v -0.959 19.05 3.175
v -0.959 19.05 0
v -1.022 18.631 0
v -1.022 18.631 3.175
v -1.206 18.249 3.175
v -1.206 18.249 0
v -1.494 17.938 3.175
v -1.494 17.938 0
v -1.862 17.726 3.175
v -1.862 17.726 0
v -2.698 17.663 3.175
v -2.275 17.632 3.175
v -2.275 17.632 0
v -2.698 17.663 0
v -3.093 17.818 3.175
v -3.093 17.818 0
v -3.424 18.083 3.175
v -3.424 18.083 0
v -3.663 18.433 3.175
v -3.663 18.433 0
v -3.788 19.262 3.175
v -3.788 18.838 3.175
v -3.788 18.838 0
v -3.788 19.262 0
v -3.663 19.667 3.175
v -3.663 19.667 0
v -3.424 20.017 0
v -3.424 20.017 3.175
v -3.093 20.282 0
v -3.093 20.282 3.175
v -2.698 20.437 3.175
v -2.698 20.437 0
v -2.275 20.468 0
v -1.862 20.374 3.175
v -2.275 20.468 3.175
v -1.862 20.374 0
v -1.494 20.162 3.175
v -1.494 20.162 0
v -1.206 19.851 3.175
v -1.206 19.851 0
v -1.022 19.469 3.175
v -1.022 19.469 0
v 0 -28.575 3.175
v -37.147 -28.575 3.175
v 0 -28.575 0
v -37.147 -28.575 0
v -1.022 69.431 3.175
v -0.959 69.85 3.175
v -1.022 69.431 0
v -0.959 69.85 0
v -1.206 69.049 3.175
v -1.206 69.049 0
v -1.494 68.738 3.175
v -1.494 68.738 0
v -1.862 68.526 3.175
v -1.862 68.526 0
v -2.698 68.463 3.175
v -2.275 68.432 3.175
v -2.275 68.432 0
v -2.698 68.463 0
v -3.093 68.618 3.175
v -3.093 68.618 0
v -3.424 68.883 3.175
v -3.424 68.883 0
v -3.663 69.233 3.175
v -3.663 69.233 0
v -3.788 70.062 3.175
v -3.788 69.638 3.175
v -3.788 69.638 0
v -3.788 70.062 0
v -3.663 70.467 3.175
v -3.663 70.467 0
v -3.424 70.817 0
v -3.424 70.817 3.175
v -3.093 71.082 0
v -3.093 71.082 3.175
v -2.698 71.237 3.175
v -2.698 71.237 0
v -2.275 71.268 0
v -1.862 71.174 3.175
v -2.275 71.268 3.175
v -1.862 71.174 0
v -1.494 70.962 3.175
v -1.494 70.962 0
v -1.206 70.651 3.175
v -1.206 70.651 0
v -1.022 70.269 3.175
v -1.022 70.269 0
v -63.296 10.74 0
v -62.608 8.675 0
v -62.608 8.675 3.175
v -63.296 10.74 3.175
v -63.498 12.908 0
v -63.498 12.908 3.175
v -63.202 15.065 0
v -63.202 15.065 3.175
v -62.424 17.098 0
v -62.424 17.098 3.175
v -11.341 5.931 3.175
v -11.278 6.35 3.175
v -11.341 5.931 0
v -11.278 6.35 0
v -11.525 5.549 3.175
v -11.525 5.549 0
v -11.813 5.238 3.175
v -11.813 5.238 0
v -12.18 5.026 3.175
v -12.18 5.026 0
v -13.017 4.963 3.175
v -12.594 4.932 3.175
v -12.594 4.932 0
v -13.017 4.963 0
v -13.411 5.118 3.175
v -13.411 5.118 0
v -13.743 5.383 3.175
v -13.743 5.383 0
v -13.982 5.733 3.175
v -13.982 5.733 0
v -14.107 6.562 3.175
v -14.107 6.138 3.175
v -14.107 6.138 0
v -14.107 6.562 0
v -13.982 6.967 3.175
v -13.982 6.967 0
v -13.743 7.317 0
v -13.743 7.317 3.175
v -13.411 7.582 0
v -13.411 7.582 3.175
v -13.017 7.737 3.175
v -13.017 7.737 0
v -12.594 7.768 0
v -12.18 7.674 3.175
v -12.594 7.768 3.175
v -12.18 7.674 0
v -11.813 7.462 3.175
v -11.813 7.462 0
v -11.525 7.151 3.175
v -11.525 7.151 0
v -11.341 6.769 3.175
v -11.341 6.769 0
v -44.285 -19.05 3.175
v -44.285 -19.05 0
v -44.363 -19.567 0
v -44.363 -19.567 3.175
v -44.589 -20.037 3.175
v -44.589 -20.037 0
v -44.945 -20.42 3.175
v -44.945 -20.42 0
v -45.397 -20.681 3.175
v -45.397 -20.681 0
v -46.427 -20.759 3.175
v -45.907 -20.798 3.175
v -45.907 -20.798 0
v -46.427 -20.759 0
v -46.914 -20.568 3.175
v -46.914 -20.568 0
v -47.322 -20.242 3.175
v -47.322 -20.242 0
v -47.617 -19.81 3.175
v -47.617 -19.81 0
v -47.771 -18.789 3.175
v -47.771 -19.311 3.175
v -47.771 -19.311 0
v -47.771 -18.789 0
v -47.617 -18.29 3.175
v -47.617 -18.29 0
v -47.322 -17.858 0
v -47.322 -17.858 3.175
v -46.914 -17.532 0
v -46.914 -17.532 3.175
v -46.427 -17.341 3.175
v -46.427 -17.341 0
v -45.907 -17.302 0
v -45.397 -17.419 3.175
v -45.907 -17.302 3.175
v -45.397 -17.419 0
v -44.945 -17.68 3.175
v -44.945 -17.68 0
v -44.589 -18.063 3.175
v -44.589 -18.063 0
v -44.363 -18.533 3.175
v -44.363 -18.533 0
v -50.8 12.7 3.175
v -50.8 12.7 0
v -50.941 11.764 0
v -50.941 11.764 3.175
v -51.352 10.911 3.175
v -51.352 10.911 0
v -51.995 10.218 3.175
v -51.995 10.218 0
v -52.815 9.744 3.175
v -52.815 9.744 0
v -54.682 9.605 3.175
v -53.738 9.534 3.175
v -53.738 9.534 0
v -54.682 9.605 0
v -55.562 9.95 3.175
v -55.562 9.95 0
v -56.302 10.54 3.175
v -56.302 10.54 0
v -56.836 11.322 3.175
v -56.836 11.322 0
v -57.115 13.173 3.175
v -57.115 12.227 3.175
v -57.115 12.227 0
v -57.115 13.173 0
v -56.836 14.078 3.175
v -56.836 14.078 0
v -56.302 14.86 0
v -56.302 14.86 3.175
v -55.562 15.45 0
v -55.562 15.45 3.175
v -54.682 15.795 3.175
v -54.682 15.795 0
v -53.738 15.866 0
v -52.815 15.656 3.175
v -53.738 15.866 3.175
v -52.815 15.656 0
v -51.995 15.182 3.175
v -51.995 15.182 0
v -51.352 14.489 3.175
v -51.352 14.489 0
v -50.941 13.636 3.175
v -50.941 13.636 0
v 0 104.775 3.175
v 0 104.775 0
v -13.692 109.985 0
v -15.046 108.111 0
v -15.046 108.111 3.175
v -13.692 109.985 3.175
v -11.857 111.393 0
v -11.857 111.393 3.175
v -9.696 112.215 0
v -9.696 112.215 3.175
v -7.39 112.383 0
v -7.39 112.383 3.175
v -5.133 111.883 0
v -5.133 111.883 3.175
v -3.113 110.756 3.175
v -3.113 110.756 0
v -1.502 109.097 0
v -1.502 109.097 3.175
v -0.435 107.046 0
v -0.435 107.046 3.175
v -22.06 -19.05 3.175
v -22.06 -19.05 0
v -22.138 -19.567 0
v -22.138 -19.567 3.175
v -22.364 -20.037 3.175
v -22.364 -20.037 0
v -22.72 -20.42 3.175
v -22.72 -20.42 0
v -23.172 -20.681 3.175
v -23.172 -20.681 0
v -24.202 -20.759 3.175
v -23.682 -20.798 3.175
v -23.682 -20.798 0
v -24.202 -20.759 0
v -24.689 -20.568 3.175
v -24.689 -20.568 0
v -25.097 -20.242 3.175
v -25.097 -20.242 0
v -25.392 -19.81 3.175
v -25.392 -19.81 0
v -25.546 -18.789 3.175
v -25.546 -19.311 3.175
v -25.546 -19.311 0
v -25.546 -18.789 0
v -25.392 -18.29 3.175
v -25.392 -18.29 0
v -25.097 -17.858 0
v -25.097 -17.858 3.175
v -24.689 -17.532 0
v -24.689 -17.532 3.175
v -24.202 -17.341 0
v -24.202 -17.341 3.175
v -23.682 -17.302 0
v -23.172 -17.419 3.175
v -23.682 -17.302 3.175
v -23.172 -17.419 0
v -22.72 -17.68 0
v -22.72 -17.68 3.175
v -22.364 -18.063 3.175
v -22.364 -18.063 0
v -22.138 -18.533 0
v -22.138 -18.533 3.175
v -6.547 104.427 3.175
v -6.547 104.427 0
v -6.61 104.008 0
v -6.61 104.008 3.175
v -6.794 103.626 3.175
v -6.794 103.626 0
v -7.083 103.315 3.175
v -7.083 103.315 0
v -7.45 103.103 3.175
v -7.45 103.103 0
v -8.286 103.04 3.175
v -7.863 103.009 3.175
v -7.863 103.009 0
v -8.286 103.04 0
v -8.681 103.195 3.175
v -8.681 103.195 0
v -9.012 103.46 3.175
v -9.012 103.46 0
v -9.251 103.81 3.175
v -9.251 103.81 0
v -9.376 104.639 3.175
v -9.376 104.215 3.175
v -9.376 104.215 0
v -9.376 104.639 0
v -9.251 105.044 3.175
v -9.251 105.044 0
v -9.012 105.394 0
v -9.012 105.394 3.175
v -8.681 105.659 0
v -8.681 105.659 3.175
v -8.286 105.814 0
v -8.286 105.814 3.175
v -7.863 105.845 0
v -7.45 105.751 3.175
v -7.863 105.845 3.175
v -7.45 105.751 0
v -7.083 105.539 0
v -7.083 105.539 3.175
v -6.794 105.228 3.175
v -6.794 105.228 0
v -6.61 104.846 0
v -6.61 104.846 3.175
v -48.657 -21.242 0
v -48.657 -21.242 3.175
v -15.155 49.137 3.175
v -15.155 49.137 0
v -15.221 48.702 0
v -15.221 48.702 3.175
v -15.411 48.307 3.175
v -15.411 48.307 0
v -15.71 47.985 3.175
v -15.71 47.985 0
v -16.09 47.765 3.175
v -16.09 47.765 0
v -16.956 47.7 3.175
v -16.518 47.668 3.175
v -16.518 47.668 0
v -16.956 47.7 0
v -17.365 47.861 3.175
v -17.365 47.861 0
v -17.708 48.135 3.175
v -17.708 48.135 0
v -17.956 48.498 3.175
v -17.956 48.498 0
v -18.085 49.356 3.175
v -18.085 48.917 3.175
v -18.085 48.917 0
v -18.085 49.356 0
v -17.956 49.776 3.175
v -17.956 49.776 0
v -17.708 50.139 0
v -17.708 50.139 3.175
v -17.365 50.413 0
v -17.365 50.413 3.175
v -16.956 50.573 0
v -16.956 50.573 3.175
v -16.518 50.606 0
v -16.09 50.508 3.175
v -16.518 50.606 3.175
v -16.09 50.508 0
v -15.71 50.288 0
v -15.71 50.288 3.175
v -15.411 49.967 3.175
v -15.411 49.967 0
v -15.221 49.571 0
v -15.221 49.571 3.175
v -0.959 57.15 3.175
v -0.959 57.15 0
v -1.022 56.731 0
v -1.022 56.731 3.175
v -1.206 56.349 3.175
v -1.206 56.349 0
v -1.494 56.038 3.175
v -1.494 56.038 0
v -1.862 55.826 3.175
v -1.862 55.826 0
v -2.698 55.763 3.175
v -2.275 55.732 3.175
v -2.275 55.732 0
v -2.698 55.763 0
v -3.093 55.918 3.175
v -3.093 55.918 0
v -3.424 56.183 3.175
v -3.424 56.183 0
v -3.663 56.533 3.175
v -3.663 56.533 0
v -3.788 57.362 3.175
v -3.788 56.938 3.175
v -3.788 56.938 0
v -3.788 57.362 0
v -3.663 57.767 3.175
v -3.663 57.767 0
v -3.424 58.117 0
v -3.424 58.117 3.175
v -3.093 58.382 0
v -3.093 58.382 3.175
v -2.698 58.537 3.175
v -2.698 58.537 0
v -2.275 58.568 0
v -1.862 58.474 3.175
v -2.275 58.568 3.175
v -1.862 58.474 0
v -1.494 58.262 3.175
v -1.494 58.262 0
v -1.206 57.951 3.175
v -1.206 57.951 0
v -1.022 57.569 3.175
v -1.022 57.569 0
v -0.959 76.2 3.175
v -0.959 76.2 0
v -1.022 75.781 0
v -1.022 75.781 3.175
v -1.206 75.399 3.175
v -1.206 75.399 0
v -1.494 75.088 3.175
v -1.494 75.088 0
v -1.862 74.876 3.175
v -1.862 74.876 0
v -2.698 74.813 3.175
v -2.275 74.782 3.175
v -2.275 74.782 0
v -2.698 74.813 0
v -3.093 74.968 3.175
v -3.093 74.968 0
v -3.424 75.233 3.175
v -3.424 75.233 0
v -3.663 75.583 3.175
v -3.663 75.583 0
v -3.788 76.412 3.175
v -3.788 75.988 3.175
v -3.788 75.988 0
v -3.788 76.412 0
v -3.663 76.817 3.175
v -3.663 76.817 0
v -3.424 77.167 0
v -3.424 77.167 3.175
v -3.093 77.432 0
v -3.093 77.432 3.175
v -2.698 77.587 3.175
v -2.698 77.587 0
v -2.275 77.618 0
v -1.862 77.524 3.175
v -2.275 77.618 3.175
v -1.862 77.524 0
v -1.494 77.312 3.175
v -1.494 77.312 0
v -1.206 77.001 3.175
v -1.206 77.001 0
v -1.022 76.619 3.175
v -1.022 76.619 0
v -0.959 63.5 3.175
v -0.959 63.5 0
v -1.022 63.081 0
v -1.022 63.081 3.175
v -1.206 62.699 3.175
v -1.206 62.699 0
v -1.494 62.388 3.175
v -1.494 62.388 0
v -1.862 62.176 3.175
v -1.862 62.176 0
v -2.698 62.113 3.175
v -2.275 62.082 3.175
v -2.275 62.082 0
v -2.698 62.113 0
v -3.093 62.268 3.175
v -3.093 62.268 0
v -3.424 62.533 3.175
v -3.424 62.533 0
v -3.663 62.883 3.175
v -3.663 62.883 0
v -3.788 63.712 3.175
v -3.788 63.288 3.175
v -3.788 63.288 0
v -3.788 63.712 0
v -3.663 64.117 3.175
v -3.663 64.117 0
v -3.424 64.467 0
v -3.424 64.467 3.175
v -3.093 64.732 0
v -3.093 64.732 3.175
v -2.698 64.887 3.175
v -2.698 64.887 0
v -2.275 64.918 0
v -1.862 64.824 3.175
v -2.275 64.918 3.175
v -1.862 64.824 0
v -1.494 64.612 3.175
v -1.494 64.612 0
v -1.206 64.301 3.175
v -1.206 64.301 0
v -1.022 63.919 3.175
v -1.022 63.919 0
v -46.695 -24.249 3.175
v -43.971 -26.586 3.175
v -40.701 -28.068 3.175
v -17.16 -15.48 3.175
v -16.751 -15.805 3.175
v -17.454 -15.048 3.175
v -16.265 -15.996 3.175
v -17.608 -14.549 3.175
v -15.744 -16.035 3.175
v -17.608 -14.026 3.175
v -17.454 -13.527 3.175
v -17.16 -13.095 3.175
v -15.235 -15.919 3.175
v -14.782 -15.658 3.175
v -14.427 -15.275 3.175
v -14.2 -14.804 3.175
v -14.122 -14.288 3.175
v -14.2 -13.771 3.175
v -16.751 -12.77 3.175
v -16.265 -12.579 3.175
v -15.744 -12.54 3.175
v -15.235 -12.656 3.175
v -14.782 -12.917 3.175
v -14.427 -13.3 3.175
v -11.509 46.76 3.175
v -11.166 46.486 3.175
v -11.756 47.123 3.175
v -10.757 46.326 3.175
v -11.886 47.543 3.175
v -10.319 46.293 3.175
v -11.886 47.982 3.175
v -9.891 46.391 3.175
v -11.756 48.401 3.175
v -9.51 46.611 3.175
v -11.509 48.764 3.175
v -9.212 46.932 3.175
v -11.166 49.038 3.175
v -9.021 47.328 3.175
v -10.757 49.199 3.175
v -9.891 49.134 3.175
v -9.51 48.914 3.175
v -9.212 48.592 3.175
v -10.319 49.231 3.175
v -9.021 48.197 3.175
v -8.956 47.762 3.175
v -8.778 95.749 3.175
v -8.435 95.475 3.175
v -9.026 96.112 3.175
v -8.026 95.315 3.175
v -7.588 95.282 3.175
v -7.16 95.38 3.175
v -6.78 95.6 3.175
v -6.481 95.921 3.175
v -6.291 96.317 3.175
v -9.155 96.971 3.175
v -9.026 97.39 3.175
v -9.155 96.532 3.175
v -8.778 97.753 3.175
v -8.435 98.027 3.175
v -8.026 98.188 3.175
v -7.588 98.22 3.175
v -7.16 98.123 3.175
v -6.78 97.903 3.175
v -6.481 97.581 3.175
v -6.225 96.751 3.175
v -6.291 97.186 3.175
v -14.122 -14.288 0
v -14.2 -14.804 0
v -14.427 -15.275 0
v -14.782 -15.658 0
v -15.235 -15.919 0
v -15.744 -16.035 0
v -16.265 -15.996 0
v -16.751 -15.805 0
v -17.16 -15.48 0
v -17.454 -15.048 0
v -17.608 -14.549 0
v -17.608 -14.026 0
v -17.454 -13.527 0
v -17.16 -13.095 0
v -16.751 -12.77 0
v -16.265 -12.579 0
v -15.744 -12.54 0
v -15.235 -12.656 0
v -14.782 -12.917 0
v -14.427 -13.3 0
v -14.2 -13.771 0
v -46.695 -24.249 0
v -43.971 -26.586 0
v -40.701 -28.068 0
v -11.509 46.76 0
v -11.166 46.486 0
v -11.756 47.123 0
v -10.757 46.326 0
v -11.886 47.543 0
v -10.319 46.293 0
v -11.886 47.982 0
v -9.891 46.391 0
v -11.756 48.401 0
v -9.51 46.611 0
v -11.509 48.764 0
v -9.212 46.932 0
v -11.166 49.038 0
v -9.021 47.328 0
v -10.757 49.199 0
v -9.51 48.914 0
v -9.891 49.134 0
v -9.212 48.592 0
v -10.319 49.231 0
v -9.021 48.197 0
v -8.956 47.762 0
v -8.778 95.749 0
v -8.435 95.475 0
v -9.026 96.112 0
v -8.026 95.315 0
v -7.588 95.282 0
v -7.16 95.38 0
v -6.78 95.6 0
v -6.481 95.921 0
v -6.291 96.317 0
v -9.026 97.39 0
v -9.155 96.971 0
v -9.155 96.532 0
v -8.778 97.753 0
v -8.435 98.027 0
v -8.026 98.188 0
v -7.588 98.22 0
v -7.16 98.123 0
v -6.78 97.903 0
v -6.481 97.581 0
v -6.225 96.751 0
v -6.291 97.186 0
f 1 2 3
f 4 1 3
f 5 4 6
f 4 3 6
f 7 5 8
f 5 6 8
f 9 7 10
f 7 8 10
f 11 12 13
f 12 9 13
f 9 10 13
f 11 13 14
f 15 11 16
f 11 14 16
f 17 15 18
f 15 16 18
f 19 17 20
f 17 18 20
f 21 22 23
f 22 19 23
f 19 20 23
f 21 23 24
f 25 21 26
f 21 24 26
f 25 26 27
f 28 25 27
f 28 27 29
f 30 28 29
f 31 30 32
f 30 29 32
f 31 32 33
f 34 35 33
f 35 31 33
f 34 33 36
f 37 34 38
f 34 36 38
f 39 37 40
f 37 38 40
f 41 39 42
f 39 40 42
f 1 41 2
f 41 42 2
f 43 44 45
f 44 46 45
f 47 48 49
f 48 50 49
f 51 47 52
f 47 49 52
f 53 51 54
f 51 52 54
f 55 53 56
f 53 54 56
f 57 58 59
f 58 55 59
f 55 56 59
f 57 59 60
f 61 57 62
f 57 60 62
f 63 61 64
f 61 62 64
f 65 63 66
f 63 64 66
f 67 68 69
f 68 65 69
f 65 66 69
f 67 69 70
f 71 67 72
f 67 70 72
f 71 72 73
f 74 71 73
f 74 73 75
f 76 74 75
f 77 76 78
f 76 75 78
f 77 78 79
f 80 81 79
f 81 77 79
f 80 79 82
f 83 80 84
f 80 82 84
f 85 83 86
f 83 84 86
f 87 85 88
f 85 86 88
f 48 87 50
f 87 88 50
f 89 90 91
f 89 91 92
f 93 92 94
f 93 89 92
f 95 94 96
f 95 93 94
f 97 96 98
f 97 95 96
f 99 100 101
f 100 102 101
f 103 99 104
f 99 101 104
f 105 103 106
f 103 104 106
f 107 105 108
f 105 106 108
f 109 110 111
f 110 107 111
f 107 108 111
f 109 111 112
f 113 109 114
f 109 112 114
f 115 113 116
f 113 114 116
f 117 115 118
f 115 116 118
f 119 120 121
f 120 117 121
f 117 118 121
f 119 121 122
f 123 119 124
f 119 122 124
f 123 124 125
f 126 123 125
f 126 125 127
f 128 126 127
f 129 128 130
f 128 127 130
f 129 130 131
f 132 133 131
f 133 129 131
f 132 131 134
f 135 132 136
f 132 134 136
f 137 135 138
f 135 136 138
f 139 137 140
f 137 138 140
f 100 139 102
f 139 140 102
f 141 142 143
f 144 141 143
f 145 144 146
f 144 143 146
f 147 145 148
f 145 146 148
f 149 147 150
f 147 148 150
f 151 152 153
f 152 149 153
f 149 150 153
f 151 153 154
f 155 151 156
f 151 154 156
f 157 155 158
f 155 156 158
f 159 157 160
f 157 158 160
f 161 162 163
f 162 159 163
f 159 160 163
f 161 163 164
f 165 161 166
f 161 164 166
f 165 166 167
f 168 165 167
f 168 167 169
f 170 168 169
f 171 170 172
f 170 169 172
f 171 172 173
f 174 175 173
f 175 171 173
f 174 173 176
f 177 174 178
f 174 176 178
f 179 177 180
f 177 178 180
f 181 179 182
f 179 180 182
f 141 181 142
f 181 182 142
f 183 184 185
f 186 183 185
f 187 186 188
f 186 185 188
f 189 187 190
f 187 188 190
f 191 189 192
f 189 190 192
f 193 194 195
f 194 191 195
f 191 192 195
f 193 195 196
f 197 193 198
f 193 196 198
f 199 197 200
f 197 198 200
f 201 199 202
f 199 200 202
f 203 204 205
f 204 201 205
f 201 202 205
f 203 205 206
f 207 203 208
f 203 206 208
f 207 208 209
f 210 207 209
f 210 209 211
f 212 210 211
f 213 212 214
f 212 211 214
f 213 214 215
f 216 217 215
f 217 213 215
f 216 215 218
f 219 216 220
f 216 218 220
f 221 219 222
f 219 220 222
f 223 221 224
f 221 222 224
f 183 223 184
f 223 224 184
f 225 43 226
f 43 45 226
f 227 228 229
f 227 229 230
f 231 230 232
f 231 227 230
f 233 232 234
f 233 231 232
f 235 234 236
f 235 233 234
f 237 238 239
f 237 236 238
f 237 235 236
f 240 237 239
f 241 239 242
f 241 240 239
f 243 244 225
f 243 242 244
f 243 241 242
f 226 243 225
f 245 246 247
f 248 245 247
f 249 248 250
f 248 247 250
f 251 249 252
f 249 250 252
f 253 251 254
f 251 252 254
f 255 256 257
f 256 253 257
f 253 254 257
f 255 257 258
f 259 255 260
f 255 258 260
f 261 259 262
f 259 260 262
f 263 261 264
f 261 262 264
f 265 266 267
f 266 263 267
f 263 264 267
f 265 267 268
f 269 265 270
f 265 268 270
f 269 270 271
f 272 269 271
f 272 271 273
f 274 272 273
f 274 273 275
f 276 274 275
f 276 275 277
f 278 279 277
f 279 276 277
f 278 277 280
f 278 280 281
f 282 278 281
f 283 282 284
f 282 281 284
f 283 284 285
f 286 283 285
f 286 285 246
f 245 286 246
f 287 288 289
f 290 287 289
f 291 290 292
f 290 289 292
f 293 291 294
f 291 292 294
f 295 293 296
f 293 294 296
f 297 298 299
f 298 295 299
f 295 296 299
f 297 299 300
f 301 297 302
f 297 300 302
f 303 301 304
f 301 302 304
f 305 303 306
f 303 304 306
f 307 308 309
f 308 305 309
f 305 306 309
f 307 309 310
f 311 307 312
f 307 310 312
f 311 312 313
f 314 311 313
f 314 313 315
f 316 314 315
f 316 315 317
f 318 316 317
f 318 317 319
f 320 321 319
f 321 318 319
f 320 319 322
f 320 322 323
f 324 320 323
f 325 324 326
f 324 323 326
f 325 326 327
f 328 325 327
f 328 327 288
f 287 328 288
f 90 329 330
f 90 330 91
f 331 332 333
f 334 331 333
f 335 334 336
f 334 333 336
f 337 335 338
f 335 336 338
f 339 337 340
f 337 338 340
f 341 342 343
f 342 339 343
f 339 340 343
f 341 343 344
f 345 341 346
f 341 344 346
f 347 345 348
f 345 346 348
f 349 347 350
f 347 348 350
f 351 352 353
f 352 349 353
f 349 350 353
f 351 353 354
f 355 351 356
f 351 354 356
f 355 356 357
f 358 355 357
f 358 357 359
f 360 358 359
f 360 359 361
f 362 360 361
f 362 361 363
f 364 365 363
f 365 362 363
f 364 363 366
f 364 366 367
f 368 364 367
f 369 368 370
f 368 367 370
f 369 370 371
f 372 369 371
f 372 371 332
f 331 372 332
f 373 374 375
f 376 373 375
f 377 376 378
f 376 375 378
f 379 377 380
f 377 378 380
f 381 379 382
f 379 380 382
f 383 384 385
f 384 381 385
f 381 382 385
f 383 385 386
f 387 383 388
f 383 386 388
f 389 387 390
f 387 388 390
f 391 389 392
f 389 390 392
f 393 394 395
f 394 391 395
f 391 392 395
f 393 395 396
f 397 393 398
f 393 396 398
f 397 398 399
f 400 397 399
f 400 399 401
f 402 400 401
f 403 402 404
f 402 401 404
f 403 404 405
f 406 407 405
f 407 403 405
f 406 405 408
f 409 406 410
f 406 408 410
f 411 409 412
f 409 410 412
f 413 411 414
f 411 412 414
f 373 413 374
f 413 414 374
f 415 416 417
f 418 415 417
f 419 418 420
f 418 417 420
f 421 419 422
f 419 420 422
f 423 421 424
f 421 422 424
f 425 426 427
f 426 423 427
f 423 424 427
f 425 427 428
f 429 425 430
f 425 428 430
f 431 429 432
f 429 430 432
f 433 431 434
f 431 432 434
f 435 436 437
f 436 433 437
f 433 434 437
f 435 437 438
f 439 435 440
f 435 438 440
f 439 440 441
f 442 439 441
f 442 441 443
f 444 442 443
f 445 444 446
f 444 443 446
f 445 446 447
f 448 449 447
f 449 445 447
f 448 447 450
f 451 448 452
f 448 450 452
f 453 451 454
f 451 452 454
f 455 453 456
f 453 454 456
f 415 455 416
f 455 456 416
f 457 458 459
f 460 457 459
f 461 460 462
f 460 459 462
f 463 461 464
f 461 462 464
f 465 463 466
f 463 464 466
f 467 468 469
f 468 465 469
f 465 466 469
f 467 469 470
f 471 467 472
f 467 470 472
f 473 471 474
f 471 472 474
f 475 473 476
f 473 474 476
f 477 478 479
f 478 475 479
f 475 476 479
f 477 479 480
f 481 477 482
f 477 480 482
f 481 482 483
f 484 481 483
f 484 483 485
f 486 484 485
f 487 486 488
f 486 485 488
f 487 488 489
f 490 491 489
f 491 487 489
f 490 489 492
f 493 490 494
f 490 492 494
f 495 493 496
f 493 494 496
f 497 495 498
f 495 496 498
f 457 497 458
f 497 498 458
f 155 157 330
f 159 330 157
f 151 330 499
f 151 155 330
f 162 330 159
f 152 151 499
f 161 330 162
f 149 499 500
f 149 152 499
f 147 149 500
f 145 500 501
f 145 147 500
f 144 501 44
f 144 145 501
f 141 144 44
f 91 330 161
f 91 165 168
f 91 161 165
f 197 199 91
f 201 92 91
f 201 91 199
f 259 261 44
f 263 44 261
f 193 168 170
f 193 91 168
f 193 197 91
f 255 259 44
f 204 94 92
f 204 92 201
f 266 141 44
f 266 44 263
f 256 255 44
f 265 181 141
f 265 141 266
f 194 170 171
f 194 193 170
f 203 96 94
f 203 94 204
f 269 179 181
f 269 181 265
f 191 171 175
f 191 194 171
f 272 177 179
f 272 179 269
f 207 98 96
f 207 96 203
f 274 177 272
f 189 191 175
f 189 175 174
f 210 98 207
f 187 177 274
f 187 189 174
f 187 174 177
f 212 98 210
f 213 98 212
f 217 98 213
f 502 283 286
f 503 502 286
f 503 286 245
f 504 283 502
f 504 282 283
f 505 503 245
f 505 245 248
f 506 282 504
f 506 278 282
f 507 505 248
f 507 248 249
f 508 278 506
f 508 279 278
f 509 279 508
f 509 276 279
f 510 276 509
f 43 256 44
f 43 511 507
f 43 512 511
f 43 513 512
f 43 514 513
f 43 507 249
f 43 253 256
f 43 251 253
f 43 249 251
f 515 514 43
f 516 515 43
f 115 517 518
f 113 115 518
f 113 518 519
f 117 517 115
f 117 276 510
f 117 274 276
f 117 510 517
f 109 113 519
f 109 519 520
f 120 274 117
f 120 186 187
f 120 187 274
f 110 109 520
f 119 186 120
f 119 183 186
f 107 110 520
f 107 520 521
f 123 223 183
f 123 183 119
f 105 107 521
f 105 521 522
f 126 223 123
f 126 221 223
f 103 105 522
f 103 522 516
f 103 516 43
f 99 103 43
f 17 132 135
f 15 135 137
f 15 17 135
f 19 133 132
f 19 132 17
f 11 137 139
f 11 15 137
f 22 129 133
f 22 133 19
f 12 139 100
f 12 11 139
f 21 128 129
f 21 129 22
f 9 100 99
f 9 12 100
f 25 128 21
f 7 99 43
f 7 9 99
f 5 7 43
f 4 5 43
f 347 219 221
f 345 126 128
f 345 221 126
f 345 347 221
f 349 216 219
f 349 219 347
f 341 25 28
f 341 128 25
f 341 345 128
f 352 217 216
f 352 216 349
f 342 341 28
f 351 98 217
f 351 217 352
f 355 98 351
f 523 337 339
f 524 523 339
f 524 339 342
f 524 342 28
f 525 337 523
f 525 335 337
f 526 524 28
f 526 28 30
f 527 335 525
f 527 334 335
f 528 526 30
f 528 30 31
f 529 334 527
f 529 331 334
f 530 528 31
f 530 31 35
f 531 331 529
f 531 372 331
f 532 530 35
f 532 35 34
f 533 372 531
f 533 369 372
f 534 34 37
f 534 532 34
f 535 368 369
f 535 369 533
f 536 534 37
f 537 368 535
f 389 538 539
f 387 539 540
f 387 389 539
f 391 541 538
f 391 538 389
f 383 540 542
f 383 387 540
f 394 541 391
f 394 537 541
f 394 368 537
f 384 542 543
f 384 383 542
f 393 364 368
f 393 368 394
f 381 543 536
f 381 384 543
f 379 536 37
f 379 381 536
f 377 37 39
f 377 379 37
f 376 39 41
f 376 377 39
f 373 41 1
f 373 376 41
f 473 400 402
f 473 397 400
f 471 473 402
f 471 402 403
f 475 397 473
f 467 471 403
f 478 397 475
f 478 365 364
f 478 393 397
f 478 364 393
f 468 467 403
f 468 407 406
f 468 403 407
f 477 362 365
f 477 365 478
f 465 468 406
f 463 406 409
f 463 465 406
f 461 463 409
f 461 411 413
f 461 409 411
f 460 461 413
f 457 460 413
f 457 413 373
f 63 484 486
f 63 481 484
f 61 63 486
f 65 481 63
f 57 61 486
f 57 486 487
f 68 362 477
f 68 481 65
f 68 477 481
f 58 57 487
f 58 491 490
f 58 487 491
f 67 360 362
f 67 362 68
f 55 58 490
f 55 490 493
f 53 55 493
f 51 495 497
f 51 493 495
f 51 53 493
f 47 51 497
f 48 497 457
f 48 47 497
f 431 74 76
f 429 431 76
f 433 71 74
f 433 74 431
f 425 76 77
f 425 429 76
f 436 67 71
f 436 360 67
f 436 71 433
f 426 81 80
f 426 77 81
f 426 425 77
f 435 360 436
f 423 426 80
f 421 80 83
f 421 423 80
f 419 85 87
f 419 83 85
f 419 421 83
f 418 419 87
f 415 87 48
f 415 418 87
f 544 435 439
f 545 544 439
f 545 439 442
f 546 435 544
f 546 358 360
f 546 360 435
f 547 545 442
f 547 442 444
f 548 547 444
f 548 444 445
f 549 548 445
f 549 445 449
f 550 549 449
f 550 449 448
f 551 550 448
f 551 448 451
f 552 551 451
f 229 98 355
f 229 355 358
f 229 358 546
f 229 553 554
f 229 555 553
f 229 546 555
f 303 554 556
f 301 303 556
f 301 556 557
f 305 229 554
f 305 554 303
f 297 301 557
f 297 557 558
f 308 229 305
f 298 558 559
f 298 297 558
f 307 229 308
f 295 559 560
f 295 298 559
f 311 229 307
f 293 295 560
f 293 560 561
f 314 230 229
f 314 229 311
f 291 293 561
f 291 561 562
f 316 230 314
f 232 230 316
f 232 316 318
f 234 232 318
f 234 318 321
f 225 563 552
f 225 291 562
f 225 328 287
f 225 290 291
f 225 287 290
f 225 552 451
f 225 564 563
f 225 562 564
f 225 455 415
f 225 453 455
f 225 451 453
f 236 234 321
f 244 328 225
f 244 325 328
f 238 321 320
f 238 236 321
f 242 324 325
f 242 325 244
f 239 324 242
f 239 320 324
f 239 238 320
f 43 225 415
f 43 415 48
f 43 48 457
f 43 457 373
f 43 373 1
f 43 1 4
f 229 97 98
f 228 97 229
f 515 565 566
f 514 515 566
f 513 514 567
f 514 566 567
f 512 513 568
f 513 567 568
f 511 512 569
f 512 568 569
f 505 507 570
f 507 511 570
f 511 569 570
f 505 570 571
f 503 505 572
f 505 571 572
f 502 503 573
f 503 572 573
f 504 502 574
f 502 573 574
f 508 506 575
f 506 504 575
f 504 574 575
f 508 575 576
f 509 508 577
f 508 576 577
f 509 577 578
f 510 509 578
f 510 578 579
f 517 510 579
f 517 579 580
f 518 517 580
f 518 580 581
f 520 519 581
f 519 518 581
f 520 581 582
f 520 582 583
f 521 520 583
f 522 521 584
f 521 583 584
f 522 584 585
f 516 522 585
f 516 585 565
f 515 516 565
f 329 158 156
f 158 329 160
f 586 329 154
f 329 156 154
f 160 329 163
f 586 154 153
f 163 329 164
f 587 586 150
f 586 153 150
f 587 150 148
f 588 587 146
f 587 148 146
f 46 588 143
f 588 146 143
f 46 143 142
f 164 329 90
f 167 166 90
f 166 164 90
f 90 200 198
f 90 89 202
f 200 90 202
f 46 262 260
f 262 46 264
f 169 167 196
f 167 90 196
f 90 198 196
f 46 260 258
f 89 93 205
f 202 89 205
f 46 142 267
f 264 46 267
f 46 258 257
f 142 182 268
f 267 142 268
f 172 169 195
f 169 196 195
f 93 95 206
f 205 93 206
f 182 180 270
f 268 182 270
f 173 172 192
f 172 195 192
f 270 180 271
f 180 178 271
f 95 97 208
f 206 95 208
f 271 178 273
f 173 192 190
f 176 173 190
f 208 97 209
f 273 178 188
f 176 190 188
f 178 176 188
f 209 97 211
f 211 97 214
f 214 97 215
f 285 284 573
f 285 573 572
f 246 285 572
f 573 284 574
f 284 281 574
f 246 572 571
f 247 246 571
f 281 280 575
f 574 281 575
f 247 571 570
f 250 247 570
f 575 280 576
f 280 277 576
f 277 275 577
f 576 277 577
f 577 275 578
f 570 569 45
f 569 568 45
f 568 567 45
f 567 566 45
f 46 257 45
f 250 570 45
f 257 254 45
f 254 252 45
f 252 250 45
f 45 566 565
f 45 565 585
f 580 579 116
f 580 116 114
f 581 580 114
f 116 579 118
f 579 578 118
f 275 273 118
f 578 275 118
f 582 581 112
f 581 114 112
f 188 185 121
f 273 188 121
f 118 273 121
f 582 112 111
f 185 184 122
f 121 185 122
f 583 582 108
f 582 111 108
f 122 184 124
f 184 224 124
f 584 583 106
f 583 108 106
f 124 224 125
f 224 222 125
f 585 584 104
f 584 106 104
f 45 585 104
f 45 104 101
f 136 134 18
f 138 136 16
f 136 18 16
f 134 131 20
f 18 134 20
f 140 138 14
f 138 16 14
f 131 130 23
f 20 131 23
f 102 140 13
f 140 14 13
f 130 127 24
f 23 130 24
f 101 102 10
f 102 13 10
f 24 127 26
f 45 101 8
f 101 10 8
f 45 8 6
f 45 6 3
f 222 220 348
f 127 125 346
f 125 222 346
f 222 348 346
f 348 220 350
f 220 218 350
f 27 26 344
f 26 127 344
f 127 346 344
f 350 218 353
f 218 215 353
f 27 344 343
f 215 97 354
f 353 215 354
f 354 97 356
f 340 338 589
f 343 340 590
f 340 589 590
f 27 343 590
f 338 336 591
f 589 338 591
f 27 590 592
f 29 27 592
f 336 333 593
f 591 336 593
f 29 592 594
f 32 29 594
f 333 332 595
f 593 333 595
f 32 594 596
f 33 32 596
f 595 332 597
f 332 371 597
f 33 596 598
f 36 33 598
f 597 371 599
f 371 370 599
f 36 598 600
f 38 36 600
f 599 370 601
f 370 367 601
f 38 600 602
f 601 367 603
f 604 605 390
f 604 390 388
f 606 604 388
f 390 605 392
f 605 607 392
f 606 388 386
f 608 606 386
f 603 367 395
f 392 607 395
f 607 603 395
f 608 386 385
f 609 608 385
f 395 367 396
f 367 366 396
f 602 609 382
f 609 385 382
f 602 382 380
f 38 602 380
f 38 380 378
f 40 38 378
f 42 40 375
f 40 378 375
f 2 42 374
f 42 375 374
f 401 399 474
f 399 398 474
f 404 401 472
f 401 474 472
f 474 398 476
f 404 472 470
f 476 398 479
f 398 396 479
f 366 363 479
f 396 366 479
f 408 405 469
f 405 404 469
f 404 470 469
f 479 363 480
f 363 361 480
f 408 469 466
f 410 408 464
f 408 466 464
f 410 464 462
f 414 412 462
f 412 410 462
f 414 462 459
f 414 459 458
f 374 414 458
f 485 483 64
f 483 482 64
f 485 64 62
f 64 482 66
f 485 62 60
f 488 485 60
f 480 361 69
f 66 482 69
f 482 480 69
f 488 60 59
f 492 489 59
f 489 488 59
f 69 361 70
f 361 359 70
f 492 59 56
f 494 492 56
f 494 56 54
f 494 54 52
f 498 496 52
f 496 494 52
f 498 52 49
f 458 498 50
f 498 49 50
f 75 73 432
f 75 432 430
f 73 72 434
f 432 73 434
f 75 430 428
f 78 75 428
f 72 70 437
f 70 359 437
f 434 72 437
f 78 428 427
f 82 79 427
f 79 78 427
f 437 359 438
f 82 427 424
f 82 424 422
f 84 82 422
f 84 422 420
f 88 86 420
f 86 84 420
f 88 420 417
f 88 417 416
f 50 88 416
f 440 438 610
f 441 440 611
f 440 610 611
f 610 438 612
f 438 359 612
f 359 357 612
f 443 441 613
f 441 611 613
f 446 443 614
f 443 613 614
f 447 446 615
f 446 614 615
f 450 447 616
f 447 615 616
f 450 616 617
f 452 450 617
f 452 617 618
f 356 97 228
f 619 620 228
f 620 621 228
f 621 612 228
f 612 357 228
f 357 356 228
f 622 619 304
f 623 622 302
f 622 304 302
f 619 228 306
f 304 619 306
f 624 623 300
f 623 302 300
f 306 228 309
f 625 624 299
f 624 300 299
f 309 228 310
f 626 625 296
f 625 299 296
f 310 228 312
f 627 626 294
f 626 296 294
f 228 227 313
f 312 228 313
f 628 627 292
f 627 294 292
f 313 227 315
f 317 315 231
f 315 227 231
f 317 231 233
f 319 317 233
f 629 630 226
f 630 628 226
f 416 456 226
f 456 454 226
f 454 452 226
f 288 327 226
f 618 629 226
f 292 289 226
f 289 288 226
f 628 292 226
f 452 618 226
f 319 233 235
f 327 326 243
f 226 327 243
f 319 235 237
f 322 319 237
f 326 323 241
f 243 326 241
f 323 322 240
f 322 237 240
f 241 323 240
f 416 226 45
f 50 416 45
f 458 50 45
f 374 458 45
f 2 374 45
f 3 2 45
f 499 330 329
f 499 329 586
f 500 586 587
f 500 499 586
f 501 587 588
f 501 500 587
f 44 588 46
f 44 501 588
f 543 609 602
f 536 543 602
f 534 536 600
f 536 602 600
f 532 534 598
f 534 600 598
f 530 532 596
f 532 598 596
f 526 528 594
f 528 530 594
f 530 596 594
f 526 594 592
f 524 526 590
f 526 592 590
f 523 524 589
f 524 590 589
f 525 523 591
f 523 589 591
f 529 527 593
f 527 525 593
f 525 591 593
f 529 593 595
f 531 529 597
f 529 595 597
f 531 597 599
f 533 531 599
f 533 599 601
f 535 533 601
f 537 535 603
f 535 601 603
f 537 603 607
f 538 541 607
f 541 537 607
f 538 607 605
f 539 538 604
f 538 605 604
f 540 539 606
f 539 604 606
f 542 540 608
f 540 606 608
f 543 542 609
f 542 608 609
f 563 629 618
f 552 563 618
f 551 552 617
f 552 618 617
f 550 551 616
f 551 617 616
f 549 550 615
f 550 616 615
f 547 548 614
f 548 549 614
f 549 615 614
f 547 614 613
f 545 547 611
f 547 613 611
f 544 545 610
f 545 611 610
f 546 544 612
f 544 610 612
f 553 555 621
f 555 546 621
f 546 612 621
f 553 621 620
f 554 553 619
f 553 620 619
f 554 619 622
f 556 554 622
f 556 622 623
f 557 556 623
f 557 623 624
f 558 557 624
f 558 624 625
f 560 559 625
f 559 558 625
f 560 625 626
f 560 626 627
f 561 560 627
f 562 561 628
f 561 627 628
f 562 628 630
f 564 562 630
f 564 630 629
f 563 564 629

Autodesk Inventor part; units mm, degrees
ref_plane "YZ Plane" through (0, 0, 0) normal (1, 0, 0) x (0, 1, 0)
ref_plane "XZ Plane" through (0, 0, 0) normal (0, 1, 0) x (-1, 0, 0)
ref_plane "XY Plane" through (0, 0, 0) normal (0, 0, 1) x (1, 0, 0)
sketch "Sketch1" plane through (0, 0, 0) normal (0, 0, 1) x (1, 0, 0)
  line L0 (0, 0) -> (0, 137.0131)
  line L1 (-11.7886, 12.2907) -> (-39.6863, 18.4755) construction
  line L2 (-39.6863, 18.4755) -> (-33.3297, 47.1481) construction
  line L3 (-33.3297, 47.1481) -> (-5.432, 40.9633) construction
  line L4 (-5.432, 40.9633) -> (-11.7886, 12.2907) construction
  line L5 (-39.6863, 18.4755) -> (-5.432, 40.9633) construction
  line L6 (-33.3297, 47.1481) -> (-11.7886, 12.2907) construction
  circle A0 centre (-53.975, 12.7) radius 3.175
  circle A1 centre (-53.975, 12.7) radius 9.525
  line L7 (0, 0) -> (-54.5315, 3.1913) construction
  line L8 (-62.4238, 17.0982) -> (0, 137.0131)
  line L9 (-27.1302, 45.7737) -> (-37.4529, 28.5497) construction
  line L10 (-11.6315, 42.3377) -> (-9.5552, 22.3649) construction
  line L11 (-19.3809, 44.0557) -> (-25.7374, 15.3831) construction
  line L12 (0, 104.775) -> (-15.0457, 108.1106)
  line L13 (-35.3766, 8.5768) -> (-19.8779, 5.1408) construction
  line L14 (-19.8779, 5.1408) -> (-21.2523, -1.0586) construction
  line L15 (-21.2523, -1.0586) -> (-36.751, 2.3773) construction
  line L16 (-36.751, 2.3773) -> (-35.3766, 8.5768) construction
  line L17 (-35.3766, 8.5768) -> (-44.7305, 2.6177) construction
  line L18 (-19.8779, 5.1408) -> (-17.2457, 1.0092) construction
  line L19 (-5.432, 40.9633) -> (-33.3297, 47.1481) construction
  line L20 (-33.3297, 47.1481) -> (-32.2475, 52.0296) construction
  line L21 (-32.2475, 52.0296) -> (-4.3498, 45.8448) construction
  line L22 (-4.3498, 45.8448) -> (-5.432, 40.9633) construction
  line L23 (-53.2878, 15.7997) -> (-53.975, 12.7) construction
  line L24 (-53.975, 12.7) -> (-57.0747, 13.3872) construction
  line L25 (-27.6272, 6.8588) -> (-34.4992, -24.1386) construction
  line L26 (-31.8676, 50.076) -> (-5.5198, 44.2349) construction
  line L27 (-5.5198, 44.2349) -> (-4.489, 48.8845) construction
  line L28 (-4.489, 48.8845) -> (-30.8368, 54.7256) construction
  line L29 (-30.8368, 54.7256) -> (-31.8676, 50.076) construction
  line L30 (-31.3522, 52.4008) -> (-5.0044, 46.5597) construction
  circle A2 centre (-29.0274, 51.8854) radius 1.4732 construction
  circle A3 centre (-22.8279, 50.5111) radius 1.4732 construction
  circle A4 centre (-16.6284, 49.1367) radius 1.4732
  circle A5 centre (-10.4289, 47.7623) radius 1.4732
  circle A6 centre (-7.6985, 96.7513) radius 1.4732
  line L31 (-53.975, 12.7) -> (-5.4185, 105.9762) construction
  line L32 (-31.2085, 56.4341) -> (0, 49.5153) construction
  circle A7 centre (-7.6985, 96.7513) radius 4.7625 construction
  line L33 (-4.7625, 50.5712) -> (-4.7625, 105.8308) construction
  line L34 (-26.3948, 55.3669) -> (-7.323, 92.0036) construction
  line L35 (-3.5958, 94.3328) -> (-4.7625, 94.5914) construction
  line L36 (-17.2457, 1.0092) -> (0, 1.0092) construction
  line L37 (0, 1.0092) -> (0, -2.1658) construction
  line L38 (0, -2.1658) -> (-17.2457, -2.1658) construction
  line L39 (-17.2457, -2.1658) -> (-17.2457, 1.0092) construction
  circle A8 centre (-12.7, 7.9375) radius 1.5875 construction
  line L40 (-12.7, 7.9375) -> (0, 7.9375) construction
  line L41 (0, 7.9375) -> (-17.2457, 1.0092)
  circle A9 centre (-12.7, 7.9375) radius 3.175 construction
  line L42 (-9.525, 7.9375) -> (-9.525, 4.111) construction
  line L43 (-9.525, 7.9375) -> (0, 7.9375) construction
  line L44 (-17.9187, 46.9837) -> (-16.8879, 51.6333) construction
  line L45 (-12.4942, 45.7811) -> (-26.2381, -16.2137) construction
  line L46 (0, 53.6985) -> (0, 7.9375) construction
  line L47 (-26.2381, -16.2137) -> (-20.0386, -17.5881) construction
  line L48 (-20.0386, -17.5881) -> (-8.7313, 7.9375)
  circle A10 centre (-12.7, 6.35) radius 1.4224
  line L49 (0, 13.4938) -> (-4.7625, 13.4938) construction
  line L50 (-4.7625, 13.4938) -> (-4.7625, 24.6063) construction
  line L51 (-4.7625, 24.6063) -> (0, 24.6063) construction
  line L52 (0, 24.6063) -> (0, 13.4938) construction
  line L53 (-4.7625, 19.05) -> (0, 19.05) construction
  circle A11 centre (-2.3813, 19.05) radius 1.4224
  line L54 (-20.7405, 8.5842) -> (-9.7454, 58.18) construction
  line L55 (-9.7454, 58.18) -> (-3.5459, 56.8056) construction
  line L56 (-3.5459, 56.8056) -> (-14.5411, 7.2098) construction
  line L57 (-14.5411, 7.2098) -> (-20.7405, 8.5842) construction
  line L58 (-12.7, 6.35) -> (-12.7, 7.9375) construction
  line L59 (-11.5442, 1.5875) -> (-9.525, 1.5875) construction
  line L60 (-9.525, 1.5875) -> (-9.525, 7.9375) construction
  line L61 (-9.525, 7.9375) -> (-11.5442, 7.9375) construction
  line L62 (-11.5442, 7.9375) -> (-11.5442, 1.5875) construction
  line L63 (-9.7454, 58.18) -> (-15.9449, 59.5544) construction
  line L64 (-18.8691, 53.6985) -> (0, 53.6985)
  line L65 (-9.7454, 58.18) -> (-17.3193, 53.3549) construction
  arc A12 (-10.2313, 55.9882) -> (-11.9373, 58.6659) centre (-11.0843, 57.3271) ccw construction
  line L66 (-4.7625, 57.15) -> (0, 57.15) construction
  circle A13 centre (-2.3813, 57.15) radius 1.4224
  circle A14 centre (-2.3813, 63.5) radius 1.4224
  line L67 (0, 7.9375) -> (-45.2378, 7.9375) construction
  line L68 (-45.2378, 7.9375) -> (-45.2378, -28.575) construction
  line L69 (-45.2378, -28.575) -> (0, -28.575)
  line L70 (0, -28.575) -> (0, 7.9375)
  line L71 (-45.2378, -28.575) -> (-62.6076, 8.6746)
  line L72 (-60.0032, 20.0747) -> (-18.8691, 53.6985)
  line L73 (-20.0386, -17.5881) -> (-20.0386, -28.575) construction
  line L74 (-20.2435, 47.4991) -> (-19.2127, 52.1487) construction
  line L75 (-12.7, -28.575) -> (-12.7, -1.0217)
  circle A15 centre (-23.8125, -19.05) radius 1.7526
  circle A16 centre (-15.875, -14.2875) radius 1.7526
  circle A17 centre (-23.8125, -19.05) radius 3.175 construction
  circle A18 centre (-2.3813, 69.85) radius 1.4224
  circle A19 centre (-2.3813, 76.2) radius 1.4224
  circle A20 centre (-15.875, -14.2875) radius 3.175 construction
  circle A21 centre (-46.0375, -19.05) radius 1.7526
  arc A22 (0, 104.775) -> (-15.0457, 108.1106) centre (-7.9697, 104.427) ccw
  circle A23 centre (-7.9697, 104.427) radius 1.4224
  line L76 (-7.9697, 104.427) -> (-15.0457, 108.1106) construction
  line L77 (-7.9697, 104.427) -> (0, 104.775) construction
  point P0 (-22.5591, 29.7194)
  point P1 (-20.7484, 1.2142)
  point P2 (-36.3367, 4.2458)
  point P3 (-49.5768, 21.1488)
  point P4 (-11.1125, 7.9375)
  point P5 (-11.4283, 6.9872)
  point P6 (-11.9574, 7.9375)
  point P7 (-13.9717, 6.9872)
  point P8 (-9.525, 6.1457)
  point P9 (-10.6215, 3.6705)
  dimension "d74" = 6.35
  dimension "d14" = 29.3687
  dimension "d15" = 28.575
  dimension "d16" = 12.5
  dimension "d17" = 6.35
  dimension "d19" = 53.975
  dimension "d22" = 19.05
  dimension "d23" = 7.9375
  dimension "d24" = 19.05
  dimension "d26" = 102.5
  dimension "d29" = 6.35
  dimension "d31" = 7.9375
  dimension "d34" = 5
  dimension "d35" = 26.9875
  dimension "d38" = 31.75
  dimension "d40" = 26.9875
  dimension "d41" = 4.7625
  dimension "d42" = 2.9464
  dimension "d43" = 2.3813
  dimension "d46" = 6.35
  dimension "d51" = 2.9464
  dimension "d52" = 92.075
  dimension "d53" = 6.35
  dimension "d54" = 9.525
  dimension "d55" = 4.7625
  dimension "d56" = 4.7625
  dimension "d60" = 12.7
  dimension "d61" = 3.175
  dimension "d63" = 3.175
  dimension "d66" = 3.175
  dimension "d67" = 12.7
  dimension "d72" = 8.7312
  dimension "d73" = 7.9375
  dimension "d80" = 12.7
  dimension "d82" = 7.9375
  dimension "d83" = 63.5
  dimension "d85" = 6.35
  dimension "d86" = 104.775
  dimension "d87" = 2.8448
  dimension "d88" = 4.7625
  dimension "d89" = 11.1125
  dimension "d90" = 2.8448
  dimension "d91" = 19.05
  dimension "d92" = 6.35
  dimension "d93" = 50.8
  dimension "d94" = 25.4
  dimension "d95" = 8.7312
  dimension "d96" = 9.525
  dimension "d97" = 6.35
  dimension "d99" = 6.35
  dimension "d101" = 3.175
  dimension "d106" = 2.8448
  dimension "d107" = 57.15
  dimension "d110" = 6.35
  dimension "d136" = 3.175
  dimension "d138" = 28.575
  dimension "d139" = 12.7
  dimension "d140" = 3.5052
  dimension "d141" = 3.5052
  dimension "d142" = 9.525
  dimension "d143" = 3.175
  dimension "d144" = 11.1125
  dimension "d145" = 6.35
  dimension "d146" = 14.2875
  dimension "d149" = 6.35
extrude "Extrusion1" add sketch "Sketch1" along normal blind 3.175 contours L70 L69 L75 L48 L41 L0 | L41 L48 L75 L69 L71 A1 L72 L64 L0 | L64 L72 A1 L8 L12 L0 | L12 A22 | A1
fillet "Fillet6" radius 12.7 1 edges at (-45.2378, -28.575, 1.5875)
equation "\"d56\" = d55"
properties part number "Uprights" material "UHMW, White"
